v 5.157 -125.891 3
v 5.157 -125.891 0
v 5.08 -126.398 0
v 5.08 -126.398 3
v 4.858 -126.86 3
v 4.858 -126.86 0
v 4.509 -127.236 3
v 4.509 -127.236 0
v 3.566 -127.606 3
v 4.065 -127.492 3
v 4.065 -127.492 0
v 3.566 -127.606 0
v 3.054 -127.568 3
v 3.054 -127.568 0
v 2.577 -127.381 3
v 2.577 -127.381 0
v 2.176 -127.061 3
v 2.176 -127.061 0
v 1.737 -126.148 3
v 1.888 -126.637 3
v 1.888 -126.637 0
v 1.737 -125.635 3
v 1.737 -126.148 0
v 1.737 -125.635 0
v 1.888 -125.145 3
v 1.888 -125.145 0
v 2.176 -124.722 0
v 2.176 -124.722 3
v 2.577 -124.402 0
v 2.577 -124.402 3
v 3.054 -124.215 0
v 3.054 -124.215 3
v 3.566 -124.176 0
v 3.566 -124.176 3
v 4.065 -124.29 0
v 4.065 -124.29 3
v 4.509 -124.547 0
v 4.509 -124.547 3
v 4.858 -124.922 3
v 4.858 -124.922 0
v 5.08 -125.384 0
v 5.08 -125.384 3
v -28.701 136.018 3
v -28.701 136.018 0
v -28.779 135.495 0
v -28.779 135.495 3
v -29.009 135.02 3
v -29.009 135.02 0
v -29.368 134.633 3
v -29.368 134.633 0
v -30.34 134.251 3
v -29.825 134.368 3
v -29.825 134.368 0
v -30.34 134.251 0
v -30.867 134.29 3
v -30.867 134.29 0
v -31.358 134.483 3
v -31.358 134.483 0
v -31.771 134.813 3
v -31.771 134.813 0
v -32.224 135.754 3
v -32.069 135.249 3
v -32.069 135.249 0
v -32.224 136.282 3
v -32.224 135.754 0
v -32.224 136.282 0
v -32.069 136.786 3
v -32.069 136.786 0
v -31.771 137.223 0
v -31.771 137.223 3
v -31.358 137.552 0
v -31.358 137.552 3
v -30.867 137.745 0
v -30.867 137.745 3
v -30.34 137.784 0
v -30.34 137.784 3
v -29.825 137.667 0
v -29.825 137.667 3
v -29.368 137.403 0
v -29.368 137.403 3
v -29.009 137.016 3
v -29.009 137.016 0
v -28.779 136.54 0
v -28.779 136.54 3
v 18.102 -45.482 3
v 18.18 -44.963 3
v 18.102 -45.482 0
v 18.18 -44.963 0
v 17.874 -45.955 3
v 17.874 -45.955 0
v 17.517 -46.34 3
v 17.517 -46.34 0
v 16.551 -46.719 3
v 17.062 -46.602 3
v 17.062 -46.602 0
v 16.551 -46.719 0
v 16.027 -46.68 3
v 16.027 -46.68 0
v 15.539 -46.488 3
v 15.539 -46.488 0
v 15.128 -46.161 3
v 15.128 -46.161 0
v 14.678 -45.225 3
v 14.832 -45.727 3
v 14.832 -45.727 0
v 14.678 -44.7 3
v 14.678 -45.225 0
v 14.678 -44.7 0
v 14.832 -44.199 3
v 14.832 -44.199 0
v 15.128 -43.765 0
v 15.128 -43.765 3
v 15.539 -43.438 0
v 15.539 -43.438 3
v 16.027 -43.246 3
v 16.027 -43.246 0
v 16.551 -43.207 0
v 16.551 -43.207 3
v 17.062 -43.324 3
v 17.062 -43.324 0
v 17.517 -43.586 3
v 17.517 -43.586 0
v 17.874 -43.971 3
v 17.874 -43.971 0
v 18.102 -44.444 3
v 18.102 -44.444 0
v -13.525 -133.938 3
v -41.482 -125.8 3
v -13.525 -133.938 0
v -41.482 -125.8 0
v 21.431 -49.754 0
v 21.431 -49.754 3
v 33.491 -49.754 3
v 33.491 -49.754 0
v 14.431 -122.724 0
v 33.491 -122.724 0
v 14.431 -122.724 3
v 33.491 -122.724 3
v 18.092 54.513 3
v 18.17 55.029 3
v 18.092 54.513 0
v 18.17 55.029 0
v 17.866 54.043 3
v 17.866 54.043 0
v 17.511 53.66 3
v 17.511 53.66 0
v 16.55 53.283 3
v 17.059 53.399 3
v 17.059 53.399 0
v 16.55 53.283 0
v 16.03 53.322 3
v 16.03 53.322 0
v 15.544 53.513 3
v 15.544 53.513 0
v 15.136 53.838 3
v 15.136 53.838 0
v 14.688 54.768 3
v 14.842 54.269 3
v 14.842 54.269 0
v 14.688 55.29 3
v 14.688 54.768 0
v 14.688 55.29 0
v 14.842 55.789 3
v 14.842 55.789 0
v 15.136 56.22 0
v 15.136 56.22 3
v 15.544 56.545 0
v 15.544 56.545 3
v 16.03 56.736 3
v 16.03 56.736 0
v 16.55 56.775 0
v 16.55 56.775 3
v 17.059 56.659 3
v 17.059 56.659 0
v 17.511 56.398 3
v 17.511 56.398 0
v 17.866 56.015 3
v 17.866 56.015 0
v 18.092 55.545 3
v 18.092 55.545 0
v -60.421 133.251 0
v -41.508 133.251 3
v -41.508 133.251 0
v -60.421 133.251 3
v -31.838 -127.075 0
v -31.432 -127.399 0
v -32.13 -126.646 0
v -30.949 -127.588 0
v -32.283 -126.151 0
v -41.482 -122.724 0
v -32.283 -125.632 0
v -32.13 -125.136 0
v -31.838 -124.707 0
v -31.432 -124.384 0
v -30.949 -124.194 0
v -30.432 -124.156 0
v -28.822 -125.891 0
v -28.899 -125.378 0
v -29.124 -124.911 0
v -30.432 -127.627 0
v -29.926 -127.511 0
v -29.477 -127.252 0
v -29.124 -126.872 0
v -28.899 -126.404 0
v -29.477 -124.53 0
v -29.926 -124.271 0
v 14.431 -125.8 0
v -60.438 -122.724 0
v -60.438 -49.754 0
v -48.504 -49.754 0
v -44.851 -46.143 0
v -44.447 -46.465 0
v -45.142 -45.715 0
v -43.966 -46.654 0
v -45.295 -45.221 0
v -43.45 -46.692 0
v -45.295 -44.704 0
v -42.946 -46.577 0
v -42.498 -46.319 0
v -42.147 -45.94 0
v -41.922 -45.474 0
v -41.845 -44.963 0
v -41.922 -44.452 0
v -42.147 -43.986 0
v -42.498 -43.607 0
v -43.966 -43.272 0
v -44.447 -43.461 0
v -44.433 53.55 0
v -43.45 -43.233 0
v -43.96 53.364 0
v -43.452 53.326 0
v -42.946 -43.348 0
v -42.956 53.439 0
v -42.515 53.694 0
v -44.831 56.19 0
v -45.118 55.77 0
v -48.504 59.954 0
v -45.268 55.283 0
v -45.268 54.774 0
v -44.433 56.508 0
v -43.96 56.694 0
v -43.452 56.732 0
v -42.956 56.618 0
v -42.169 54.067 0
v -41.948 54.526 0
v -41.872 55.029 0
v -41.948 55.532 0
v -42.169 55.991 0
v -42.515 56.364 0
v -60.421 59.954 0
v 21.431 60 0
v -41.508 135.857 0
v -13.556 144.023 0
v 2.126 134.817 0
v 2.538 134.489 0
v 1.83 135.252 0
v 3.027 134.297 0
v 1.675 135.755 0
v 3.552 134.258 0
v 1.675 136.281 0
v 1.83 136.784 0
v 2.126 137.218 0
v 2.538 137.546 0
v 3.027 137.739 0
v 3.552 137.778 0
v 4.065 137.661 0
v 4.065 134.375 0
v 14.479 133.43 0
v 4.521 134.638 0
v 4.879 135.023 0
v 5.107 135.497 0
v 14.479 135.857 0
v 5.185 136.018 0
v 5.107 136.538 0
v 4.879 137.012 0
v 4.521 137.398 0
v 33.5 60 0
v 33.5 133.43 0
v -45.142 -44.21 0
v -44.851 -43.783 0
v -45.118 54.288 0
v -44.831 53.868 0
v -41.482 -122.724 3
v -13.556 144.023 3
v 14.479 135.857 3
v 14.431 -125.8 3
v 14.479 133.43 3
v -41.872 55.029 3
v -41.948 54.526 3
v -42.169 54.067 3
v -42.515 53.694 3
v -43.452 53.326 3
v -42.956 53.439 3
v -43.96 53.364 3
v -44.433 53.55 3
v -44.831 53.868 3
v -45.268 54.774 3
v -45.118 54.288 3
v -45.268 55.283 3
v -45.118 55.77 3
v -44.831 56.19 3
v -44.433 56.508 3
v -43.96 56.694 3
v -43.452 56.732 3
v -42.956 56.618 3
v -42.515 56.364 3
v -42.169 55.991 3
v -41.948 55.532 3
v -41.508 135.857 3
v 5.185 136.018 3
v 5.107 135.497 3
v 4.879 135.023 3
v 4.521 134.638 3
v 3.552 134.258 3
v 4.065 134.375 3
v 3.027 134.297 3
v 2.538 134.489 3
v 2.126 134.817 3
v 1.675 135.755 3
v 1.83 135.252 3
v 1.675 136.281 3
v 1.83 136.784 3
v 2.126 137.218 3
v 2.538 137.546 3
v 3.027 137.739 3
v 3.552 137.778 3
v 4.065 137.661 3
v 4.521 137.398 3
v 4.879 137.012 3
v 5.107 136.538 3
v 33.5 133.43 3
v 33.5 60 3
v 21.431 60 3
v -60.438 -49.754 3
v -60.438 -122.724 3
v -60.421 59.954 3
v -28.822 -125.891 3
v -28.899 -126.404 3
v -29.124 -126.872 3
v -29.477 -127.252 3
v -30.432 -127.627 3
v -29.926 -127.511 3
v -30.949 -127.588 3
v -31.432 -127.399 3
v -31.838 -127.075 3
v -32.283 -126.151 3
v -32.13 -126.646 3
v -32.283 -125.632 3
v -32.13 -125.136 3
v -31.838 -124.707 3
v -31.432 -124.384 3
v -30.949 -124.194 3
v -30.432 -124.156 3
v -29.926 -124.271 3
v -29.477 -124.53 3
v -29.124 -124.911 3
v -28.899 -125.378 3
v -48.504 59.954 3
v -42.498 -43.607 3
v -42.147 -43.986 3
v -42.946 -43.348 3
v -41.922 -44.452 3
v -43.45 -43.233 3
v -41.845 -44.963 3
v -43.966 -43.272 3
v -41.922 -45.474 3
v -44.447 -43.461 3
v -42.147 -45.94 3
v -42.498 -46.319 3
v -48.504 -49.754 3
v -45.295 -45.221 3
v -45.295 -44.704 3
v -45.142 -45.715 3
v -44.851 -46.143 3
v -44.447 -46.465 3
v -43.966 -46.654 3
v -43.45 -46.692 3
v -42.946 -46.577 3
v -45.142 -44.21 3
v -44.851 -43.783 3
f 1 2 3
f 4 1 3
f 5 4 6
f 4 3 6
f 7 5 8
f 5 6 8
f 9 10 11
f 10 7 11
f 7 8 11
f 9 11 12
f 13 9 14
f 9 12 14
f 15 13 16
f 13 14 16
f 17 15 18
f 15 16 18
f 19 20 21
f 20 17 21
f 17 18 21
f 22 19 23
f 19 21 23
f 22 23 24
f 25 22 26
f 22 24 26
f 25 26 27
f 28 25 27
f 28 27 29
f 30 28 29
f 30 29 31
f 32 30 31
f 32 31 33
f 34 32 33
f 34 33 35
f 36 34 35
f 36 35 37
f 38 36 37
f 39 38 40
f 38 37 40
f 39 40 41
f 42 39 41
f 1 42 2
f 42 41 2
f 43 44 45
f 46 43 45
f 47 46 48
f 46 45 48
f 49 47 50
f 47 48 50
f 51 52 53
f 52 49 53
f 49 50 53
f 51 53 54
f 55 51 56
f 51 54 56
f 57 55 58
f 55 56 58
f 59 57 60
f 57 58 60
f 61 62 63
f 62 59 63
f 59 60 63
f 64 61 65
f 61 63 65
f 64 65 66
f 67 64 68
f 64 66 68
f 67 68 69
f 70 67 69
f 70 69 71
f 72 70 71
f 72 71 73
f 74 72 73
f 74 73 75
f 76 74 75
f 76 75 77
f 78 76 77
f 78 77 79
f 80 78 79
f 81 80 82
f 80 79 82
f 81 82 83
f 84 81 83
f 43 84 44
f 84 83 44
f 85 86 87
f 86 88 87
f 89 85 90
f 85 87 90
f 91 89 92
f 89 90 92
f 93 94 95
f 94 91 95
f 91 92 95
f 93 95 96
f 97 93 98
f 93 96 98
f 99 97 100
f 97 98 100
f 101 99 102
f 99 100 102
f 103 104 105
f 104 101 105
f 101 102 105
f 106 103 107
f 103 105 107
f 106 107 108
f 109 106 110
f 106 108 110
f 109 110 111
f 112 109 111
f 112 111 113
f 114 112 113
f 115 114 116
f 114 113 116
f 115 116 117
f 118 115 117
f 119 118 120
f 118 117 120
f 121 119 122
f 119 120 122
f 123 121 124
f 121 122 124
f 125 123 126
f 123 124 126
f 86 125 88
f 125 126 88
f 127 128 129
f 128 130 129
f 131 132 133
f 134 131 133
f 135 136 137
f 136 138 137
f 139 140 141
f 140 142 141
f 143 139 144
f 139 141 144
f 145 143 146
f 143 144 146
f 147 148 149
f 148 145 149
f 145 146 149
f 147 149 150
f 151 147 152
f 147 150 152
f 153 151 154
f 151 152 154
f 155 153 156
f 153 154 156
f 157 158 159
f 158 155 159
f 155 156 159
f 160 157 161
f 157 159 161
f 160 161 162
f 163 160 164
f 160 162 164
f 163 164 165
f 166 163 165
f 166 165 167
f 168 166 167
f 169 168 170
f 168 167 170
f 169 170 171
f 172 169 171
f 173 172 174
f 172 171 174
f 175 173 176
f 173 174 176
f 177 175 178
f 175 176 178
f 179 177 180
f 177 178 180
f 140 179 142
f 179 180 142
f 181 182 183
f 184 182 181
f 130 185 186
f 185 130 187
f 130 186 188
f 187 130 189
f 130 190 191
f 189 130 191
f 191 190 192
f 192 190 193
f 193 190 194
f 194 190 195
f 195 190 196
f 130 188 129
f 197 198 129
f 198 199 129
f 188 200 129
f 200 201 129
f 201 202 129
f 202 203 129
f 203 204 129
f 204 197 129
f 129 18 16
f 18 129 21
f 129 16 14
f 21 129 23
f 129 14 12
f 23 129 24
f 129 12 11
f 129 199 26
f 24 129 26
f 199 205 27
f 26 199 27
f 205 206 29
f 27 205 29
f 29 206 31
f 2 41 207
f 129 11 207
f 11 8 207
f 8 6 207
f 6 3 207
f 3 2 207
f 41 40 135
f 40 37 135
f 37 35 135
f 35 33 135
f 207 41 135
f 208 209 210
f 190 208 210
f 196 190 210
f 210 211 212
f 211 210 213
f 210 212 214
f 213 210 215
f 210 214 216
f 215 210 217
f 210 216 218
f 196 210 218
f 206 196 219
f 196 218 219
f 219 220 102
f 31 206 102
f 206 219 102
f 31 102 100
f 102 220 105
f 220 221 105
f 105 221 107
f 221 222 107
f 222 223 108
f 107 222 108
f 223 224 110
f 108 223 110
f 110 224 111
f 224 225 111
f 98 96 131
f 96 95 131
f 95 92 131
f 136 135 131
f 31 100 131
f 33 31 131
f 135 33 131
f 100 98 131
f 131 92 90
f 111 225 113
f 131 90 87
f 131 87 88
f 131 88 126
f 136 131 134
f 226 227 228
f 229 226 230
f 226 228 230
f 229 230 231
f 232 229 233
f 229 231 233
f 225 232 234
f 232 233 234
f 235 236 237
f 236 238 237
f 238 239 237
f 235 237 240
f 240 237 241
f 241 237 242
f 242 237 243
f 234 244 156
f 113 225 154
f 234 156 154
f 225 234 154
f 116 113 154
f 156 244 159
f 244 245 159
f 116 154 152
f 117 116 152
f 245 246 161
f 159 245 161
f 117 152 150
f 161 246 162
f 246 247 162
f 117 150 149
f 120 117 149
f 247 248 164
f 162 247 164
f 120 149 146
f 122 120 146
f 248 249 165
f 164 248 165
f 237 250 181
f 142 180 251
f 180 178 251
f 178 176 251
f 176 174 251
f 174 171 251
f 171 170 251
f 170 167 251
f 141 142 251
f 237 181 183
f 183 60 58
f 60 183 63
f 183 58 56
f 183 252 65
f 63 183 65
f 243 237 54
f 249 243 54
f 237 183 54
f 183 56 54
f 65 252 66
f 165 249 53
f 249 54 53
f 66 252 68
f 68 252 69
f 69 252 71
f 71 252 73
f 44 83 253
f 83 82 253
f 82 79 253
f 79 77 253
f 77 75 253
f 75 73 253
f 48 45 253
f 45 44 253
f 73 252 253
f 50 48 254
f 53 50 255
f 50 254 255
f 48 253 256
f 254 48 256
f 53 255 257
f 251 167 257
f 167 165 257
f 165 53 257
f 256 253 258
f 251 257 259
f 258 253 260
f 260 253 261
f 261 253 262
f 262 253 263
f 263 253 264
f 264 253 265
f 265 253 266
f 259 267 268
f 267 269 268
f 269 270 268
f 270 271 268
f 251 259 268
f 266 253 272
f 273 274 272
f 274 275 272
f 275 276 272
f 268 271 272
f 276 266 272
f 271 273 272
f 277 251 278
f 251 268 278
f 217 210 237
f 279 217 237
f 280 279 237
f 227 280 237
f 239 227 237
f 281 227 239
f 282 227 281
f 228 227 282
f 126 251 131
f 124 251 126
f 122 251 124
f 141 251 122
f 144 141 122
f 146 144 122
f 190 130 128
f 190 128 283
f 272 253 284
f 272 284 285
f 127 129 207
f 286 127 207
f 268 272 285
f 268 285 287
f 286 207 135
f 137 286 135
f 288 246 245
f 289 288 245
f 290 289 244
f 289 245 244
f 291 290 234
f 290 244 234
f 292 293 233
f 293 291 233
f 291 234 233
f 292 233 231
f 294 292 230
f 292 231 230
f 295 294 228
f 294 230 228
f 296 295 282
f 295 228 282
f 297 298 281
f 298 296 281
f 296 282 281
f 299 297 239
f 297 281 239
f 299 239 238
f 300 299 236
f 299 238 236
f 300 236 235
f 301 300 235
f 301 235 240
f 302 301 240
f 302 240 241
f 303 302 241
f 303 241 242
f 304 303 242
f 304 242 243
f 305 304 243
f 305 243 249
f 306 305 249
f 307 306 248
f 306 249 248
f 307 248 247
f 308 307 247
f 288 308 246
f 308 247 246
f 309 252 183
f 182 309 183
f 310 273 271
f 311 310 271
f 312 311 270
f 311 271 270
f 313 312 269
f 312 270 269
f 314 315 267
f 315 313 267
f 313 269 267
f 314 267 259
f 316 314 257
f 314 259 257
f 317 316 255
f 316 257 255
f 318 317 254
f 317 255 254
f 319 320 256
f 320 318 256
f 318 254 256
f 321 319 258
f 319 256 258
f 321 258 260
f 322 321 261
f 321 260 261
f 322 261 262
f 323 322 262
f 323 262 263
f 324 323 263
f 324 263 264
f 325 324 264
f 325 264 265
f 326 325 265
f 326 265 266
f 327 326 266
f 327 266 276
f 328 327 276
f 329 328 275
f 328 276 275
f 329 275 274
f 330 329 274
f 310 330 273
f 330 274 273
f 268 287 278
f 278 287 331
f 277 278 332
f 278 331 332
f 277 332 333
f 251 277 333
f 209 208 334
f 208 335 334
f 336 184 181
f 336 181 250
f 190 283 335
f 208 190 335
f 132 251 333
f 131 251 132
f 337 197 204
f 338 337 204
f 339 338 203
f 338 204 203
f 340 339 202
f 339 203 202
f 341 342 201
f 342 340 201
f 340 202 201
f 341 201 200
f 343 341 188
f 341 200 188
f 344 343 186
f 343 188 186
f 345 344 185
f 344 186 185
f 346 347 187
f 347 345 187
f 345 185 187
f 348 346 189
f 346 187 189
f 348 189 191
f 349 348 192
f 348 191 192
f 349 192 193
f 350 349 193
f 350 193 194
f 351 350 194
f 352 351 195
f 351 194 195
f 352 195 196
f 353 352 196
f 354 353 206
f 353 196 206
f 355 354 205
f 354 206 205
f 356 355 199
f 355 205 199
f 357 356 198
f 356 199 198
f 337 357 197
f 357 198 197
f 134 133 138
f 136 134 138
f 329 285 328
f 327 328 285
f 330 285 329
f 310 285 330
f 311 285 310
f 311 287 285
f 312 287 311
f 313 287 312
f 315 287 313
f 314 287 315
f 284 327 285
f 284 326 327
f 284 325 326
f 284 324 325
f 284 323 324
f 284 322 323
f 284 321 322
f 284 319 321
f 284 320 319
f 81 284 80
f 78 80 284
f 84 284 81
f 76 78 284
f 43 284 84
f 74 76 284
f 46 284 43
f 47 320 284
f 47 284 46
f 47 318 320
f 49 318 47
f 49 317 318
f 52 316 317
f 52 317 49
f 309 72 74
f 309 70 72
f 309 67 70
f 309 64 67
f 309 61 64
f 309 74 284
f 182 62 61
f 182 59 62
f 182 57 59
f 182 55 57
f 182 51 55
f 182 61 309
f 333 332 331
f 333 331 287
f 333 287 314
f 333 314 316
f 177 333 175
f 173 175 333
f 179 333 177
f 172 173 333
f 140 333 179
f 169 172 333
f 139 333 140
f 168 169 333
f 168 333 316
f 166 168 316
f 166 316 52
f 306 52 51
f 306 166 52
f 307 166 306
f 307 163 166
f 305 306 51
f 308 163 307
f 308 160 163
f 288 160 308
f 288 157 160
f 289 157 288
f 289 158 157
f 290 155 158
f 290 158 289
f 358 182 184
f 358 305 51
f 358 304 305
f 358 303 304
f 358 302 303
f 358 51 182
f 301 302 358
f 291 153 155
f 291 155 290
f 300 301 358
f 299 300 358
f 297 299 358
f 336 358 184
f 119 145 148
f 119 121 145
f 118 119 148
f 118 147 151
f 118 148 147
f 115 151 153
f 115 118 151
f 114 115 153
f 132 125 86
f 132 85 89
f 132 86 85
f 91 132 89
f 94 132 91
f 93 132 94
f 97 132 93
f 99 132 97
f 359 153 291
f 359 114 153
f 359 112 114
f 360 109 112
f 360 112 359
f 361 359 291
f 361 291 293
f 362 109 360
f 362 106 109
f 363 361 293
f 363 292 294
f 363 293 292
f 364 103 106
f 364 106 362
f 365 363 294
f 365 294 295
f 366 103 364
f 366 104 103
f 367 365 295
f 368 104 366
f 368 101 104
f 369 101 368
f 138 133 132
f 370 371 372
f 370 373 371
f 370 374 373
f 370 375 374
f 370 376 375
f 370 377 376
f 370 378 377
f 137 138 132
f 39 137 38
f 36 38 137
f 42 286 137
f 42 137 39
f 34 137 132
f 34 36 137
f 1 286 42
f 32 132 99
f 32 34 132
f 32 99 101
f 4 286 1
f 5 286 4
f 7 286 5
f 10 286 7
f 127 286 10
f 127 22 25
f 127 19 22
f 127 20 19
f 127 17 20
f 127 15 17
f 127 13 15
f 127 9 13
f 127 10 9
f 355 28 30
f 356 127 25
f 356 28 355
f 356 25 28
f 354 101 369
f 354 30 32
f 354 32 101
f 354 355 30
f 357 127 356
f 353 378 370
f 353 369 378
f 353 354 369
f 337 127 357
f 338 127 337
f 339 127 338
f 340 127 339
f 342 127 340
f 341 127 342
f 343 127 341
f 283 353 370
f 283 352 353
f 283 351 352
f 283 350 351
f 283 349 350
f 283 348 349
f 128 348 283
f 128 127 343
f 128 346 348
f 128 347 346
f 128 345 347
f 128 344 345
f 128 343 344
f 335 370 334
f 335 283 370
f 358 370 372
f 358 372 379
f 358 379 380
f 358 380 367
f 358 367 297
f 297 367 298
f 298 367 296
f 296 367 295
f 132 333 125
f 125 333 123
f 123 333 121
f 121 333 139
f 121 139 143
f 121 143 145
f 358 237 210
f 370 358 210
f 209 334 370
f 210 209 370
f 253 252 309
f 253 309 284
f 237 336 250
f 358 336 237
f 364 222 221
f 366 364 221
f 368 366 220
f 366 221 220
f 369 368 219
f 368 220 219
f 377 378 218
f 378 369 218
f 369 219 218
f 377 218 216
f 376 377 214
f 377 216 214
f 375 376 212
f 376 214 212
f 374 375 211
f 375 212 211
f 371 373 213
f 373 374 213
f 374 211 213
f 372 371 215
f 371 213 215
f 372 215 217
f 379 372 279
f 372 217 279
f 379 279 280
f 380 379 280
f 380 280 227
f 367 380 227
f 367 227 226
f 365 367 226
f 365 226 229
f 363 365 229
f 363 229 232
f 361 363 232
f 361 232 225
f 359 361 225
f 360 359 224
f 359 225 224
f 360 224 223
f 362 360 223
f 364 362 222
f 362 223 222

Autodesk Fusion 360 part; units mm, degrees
sketch "Skizze1" plane through (0, 0, 0) normal (0, 0, 1) x (1, 0, 0)
  line L0 (-48.5045, 60.0252) -> (-48.5045, -50)
  line L1 (21.4307, 60.0126) -> (21.4307, -50)
  line L2 (-41.5077, 135.8568) -> (-13.5563, 144.0233)
  line L3 (-13.5563, 144.0233) -> (14.4793, 135.8568)
  line L4 (-41.4821, -125.8001) -> (-13.5254, -133.9377)
  line L5 (-13.5254, -133.9377) -> (14.4312, -125.8001)
  line L6 (14.4312, -125.8001) -> (14.4312, -57)
  line L7 (-41.4821, -125.8001) -> (-41.4821, -57)
  line L8 (-41.5077, 135.8568) -> (-41.5077, 66.6867)
  line L9 (14.4793, 135.8568) -> (14.4793, 66.6867)
  circle A0 centre (3.4202, 136.0177) radius 1.7651
  circle A1 centre (-30.4724, 136.0177) radius 1.7717
  circle A2 centre (-30.5621, -125.8912) radius 1.7405
  circle A3 centre (3.437, -125.8912) radius 1.7197
  circle A4 centre (-43.5796, -44.9629) radius 1.7343
  circle A5 centre (16.4191, -44.9629) radius 1.761
  circle A6 centre (-43.5796, 55.0289) radius 1.7075
  circle A7 centre (16.4191, 55.0289) radius 1.7507
  line L10 (21.4307, 60.0126) -> (21.4793, 60.0126)
  line L11 (14.4793, 67.0126) -> (14.4793, 66.6867)
  line L12 (-41.5077, 66.6867) -> (-41.5077, 67.0252)
  line L13 (-48.5077, 60.0252) -> (-48.5045, 60.0252)
  line L14 (-48.5045, -50) -> (-48.4821, -50)
  line L15 (21.4312, -50) -> (21.4307, -50)
  arc A8 (21.4312, -50) -> (14.4312, -57) centre (21.4312, -57) ccw
  arc A9 (-41.4821, -57) -> (-48.4821, -50) centre (-48.4821, -57) ccw
  arc A10 (-48.5077, 60.0252) -> (-41.5077, 67.0252) centre (-48.5077, 67.0252) ccw
  arc A11 (14.4793, 67.0126) -> (21.4793, 60.0126) centre (21.4793, 67.0126) ccw
  dimension "d1" = 7
  dimension "d2" = 7
  dimension "d3" = 7
  dimension "d4" = 7
extrude "Extrusion1" add sketch "Skizze1" along normal blind 3
sketch "Skizze2" plane through (0, 0, 3) normal (0, 0, 1) x (-1, 0, 0)
  circle A0 centre (43.5796, 44.9629) radius 1.7343
  circle A1 centre (30.5621, 125.8912) radius 1.7405
  circle A2 centre (-16.4191, -55.0289) radius 1.7507
  circle A3 centre (-16.4191, 44.9629) radius 1.761
  circle A4 centre (30.4724, -136.0177) radius 1.7717
  circle A5 centre (-3.437, 125.8912) radius 1.7197
  circle A6 centre (-3.4202, -136.0177) radius 1.7651
  circle A7 centre (43.5796, -55.0289) radius 1.7075
  line L0 (41.5077, -135.8568) -> (41.5077, -67.0252)
  arc A8 (48.5045, -60.0252) -> (41.5077, -67.0252) centre (48.5077, -67.0252) ccw
  line L1 (48.5045, -60.0252) -> (48.5045, 50)
  line L2 (48.5045, 50) -> (48.4821, 50)
  arc A9 (41.4821, 57) -> (48.4821, 50) centre (48.4821, 57) ccw
  line L3 (41.4821, 57) -> (41.4821, 125.8001)
  line L4 (41.4821, 125.8001) -> (13.5254, 133.9377)
  line L5 (13.5254, 133.9377) -> (-14.4312, 125.8001)
  line L6 (-14.4312, 125.8001) -> (-14.4312, 57)
  arc A10 (-21.4307, 50) -> (-14.4312, 57) centre (-21.4312, 57) ccw
  line L7 (-21.4307, 50) -> (-21.4307, -60.0126)
  line L8 (-21.4307, -60.0126) -> (-21.4793, -60.0126)
  arc A11 (-14.4793, -67.0126) -> (-21.4793, -60.0126) centre (-21.4793, -67.0126) ccw
  line L9 (-14.4793, -67.0126) -> (-14.4793, -135.8568)
  line L10 (-14.4793, -135.8568) -> (13.5563, -144.0233)
  line L11 (13.5563, -144.0233) -> (41.5077, -135.8568)
  line L12 (60.3895, -133.2143) -> (41.496, -133.2143)
  line L13 (41.496, -133.2143) -> (41.496, -60.1458)
  line L14 (60.3895, -60.1458) -> (60.3895, -133.2143)
  line L15 (-14.4793, -133.43) -> (-33.5, -133.43)
  line L16 (-33.5, -133.43) -> (-33.5, -60)
  line L17 (-33.5, -60) -> (-14.4793, -60)
  line L18 (-14.4793, -60) -> (-14.4793, -133.43)
  line L19 (60.4376, 49.7535) -> (40.5505, 49.7535)
  line L20 (40.5505, 49.7535) -> (40.5505, 122.7237)
  line L21 (40.5505, 122.7237) -> (60.4376, 122.7237)
  line L22 (60.4376, 122.7237) -> (60.4376, 49.7535)
  line L23 (-12.9102, 49.7535) -> (-33.4913, 49.7535)
  line L24 (-33.4913, 49.7535) -> (-33.4913, 122.7237)
  line L25 (-33.4913, 122.7237) -> (-12.9102, 122.7237)
  line L26 (-12.9102, 122.7237) -> (-12.9102, 49.7535)
sketch "Skizze3" plane through (0, 0, 3) normal (0, 0, 1) x (-1, 0, 0)
  line L0 (60.4211, -59.9543) -> (41.4063, -59.9543)
  line L1 (41.4063, -59.9543) -> (41.4063, -133.2514)
  line L2 (41.4063, -133.2514) -> (60.4211, -133.2514)
  line L3 (60.4211, -133.2514) -> (60.4211, -59.9543)
extrude "Extrusion2" add sketch "Skizze3" sketch "Skizze2" against normal blind 3 of sketch 2 contours L7 A11 L9 L15 L16 L17 L18 | L1 L2 A9 L3 L19 L21 L22 | L6 A10 L7 L23 L24 L25
